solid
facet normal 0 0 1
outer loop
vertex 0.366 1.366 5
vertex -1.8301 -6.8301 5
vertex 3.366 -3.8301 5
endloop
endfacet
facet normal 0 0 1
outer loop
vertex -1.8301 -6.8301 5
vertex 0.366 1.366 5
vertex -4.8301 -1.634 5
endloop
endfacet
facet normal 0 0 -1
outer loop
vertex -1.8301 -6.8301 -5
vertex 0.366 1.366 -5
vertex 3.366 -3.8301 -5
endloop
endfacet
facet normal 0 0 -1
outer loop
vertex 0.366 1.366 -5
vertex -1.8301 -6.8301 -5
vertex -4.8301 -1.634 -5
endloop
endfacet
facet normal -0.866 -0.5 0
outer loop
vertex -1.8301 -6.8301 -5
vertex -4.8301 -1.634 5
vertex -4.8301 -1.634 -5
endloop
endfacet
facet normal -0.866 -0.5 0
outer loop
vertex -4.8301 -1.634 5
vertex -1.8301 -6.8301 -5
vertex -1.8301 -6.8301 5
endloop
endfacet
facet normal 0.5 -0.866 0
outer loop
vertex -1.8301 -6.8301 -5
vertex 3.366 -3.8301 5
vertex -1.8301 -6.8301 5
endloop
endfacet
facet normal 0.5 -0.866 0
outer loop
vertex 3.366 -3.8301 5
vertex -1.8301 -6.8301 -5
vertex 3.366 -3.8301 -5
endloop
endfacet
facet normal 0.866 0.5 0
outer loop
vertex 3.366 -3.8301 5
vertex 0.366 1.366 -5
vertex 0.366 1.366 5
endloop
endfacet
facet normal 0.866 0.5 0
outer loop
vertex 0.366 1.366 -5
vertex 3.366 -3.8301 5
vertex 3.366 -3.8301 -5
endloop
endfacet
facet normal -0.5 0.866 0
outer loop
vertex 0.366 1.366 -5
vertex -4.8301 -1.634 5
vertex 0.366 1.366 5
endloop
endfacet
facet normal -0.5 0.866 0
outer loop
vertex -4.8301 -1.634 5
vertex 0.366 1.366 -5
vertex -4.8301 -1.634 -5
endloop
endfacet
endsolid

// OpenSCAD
rotate([0,0,+30]) {
    intersection() {
        cube(10, center=true);
        translate([-4,-4,0])
            cube(10, center=true);
    }
}
